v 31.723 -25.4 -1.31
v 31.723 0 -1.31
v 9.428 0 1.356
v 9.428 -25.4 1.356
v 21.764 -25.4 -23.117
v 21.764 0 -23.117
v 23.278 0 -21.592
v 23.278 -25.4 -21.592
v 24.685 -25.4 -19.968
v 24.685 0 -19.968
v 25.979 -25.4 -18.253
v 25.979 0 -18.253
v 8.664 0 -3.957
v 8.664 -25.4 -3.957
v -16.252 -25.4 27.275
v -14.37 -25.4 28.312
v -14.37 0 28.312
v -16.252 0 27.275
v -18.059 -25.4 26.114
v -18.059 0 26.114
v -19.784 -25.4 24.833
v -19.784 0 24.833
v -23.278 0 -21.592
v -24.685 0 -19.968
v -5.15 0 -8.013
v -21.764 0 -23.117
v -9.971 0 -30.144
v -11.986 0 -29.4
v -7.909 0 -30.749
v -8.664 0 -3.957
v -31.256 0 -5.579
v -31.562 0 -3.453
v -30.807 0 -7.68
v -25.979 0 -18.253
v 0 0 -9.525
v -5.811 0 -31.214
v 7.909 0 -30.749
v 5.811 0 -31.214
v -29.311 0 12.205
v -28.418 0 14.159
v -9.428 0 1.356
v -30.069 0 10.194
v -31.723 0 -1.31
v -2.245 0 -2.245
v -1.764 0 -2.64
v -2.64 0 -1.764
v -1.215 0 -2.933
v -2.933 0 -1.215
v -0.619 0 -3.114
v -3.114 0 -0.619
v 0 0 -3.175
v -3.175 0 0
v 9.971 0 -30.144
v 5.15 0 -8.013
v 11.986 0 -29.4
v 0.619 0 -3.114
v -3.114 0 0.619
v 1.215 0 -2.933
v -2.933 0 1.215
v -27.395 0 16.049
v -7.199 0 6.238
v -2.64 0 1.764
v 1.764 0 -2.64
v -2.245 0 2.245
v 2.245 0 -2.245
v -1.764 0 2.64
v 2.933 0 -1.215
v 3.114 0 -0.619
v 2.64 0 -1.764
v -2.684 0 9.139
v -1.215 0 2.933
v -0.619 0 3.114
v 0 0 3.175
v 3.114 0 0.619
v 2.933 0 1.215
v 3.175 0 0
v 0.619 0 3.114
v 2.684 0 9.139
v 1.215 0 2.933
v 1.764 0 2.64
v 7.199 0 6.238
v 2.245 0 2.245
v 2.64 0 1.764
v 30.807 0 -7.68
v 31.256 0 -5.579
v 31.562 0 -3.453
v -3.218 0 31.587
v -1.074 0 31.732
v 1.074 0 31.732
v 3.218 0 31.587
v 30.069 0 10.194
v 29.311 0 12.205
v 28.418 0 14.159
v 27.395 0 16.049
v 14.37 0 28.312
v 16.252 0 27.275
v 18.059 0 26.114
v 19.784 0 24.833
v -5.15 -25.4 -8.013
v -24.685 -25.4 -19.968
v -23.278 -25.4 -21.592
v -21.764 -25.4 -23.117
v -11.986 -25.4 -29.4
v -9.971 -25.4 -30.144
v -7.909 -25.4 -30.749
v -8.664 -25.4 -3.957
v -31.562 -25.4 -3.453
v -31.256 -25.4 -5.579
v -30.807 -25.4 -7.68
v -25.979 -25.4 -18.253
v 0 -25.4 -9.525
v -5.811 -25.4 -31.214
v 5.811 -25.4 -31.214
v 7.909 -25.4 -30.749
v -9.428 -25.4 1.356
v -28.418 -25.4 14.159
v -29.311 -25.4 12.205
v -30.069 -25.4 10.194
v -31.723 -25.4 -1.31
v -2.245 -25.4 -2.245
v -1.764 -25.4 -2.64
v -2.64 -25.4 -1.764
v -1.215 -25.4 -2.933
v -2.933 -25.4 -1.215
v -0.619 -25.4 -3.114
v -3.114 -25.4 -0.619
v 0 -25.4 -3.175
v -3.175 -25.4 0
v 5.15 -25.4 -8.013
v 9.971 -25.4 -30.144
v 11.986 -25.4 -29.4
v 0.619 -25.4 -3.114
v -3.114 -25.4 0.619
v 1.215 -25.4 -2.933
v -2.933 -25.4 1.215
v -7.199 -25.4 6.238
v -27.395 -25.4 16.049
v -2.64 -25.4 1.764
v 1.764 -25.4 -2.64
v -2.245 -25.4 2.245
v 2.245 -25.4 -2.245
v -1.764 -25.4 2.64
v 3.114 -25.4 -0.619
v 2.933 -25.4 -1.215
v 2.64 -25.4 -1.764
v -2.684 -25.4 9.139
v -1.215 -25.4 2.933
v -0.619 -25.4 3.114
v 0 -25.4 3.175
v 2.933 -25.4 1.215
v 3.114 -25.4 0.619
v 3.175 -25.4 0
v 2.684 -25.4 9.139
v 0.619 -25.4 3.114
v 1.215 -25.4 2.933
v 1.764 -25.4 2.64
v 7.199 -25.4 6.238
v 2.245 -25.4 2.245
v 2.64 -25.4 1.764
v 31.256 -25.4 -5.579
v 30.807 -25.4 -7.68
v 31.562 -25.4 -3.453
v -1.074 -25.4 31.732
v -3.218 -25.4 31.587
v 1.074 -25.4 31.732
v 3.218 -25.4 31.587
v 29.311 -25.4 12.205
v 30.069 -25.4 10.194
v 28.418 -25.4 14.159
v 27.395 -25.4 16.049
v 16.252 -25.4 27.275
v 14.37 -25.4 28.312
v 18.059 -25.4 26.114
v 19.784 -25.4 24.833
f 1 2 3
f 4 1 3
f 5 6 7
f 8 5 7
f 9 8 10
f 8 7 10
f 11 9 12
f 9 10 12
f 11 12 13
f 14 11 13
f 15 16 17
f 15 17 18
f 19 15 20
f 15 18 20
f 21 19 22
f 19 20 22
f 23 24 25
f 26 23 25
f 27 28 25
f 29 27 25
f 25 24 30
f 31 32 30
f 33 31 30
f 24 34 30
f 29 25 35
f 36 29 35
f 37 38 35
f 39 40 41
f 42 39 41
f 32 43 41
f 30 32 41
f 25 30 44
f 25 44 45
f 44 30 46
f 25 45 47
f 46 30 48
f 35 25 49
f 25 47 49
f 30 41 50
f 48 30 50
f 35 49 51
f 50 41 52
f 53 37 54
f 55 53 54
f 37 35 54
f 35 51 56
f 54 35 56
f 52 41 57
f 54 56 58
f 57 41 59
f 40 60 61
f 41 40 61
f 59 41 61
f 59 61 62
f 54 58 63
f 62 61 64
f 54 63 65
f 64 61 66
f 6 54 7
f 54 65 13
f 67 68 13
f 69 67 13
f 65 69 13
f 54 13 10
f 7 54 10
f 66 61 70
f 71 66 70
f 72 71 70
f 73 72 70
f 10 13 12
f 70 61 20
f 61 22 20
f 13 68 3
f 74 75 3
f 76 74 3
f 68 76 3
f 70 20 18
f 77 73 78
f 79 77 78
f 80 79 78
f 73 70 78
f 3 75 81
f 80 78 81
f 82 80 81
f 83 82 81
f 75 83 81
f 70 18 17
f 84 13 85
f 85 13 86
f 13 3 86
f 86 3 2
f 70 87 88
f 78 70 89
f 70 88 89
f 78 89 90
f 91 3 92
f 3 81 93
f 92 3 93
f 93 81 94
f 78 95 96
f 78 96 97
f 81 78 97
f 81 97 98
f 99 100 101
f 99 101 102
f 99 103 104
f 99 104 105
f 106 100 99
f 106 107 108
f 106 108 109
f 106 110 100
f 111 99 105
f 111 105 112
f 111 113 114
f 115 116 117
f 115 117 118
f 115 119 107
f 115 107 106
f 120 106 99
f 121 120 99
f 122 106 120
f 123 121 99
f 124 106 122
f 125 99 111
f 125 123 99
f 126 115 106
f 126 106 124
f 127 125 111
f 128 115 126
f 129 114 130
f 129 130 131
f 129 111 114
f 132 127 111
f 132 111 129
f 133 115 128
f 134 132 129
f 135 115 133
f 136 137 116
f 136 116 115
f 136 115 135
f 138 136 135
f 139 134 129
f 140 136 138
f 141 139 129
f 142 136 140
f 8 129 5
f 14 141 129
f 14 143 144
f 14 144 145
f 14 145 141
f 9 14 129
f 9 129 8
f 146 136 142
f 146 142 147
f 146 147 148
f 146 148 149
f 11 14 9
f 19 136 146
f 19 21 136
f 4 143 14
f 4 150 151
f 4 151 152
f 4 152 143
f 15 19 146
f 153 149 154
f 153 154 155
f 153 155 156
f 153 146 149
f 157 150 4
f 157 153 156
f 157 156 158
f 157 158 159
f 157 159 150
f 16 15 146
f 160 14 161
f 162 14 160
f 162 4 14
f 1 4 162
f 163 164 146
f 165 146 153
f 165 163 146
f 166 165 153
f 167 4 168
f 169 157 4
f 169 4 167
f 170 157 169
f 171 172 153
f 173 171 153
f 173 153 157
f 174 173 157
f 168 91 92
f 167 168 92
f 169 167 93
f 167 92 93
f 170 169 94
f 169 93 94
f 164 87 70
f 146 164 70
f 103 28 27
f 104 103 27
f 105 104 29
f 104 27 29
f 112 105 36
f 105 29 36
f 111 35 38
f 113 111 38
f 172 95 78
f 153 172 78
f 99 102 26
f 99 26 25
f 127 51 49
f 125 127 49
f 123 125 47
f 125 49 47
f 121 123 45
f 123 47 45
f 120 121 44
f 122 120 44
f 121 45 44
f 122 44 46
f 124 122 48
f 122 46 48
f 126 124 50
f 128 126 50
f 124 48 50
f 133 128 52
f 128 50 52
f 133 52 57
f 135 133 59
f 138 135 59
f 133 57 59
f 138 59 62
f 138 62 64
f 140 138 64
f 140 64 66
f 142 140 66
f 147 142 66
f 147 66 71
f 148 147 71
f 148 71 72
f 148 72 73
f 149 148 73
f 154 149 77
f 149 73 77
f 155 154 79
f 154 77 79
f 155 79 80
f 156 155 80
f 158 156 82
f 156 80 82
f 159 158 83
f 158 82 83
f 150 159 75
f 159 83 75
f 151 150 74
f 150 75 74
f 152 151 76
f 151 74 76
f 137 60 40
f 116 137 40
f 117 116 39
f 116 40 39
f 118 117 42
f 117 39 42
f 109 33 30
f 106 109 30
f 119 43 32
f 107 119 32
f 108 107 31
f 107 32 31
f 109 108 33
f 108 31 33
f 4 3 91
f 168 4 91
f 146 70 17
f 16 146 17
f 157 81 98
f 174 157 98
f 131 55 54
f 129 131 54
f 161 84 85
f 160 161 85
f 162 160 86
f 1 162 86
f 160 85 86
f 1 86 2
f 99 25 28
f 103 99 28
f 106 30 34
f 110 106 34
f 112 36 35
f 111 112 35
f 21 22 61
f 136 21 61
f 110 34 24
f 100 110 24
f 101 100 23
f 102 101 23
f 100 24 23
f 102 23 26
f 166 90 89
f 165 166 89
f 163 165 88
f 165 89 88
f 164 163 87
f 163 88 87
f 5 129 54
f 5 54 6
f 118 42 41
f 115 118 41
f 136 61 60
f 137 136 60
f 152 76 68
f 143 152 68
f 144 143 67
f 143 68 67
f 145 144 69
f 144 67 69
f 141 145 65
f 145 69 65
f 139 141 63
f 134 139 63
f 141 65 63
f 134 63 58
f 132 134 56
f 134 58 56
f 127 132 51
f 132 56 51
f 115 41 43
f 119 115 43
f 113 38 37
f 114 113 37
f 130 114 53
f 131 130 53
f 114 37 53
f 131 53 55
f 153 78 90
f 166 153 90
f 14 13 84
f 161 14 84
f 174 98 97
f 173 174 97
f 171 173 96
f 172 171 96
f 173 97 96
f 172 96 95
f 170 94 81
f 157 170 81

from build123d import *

# Parameters (mm, degrees)
F1_DEPTH = 25.4


with BuildPart() as f1:
    # F0 (on Front) → F1 (new body)
    with BuildSketch(Plane.XZ):
        with BuildLine():
            ThreePointArc((-9.428049, 1.355549), (-8.664245, 3.956828), (-7.198515, 6.237548))
            Line((-7.198515, 6.237548), (-27.395362, 16.048571))
            ThreePointArc((-27.395362, 16.048571), (-28.880816, 13.189427), (-30.068848, 10.194454))
            Line((-30.068848, 10.194454), (-9.428049, 1.355549))
        make_face()
        with BuildLine():
            ThreePointArc((-7.198515, 6.237548), (-5.149604, 8.01294), (-2.683503, 9.139171))
            Line((-2.683503, 9.139171), (-14.369933, 28.311968))
            ThreePointArc((-14.369933, 28.311968), (-17.165346, 26.7098), (-19.783986, 24.832567))
            Line((-19.783986, 24.832567), (-7.198515, 6.237548))
        make_face()
        with BuildLine():
            ThreePointArc((9.525, 0), (9.500731, 0.679506), (9.428049, 1.355549))
            ThreePointArc((9.428049, 1.355549), (8.664245, 3.956828), (7.198515, 6.237548))
            ThreePointArc((7.198515, 6.237548), (5.149604, 8.01294), (2.683503, 9.139171))
            ThreePointArc((2.683503, 9.139171), (0, 9.525), (-2.683503, 9.139171))
            ThreePointArc((-2.683503, 9.139171), (-5.149604, 8.01294), (-7.198515, 6.237548))
            ThreePointArc((-7.198515, 6.237548), (-8.664245, 3.956828), (-9.428049, 1.355549))
            ThreePointArc((-9.428049, 1.355549), (-9.428049, -1.355549), (-8.664245, -3.956828))
            ThreePointArc((-8.664245, -3.956828), (-7.198515, -6.237548), (-5.149604, -8.01294))
            ThreePointArc((-5.149604, -8.01294), (-2.683503, -9.139171), (0, -9.525))
            ThreePointArc((0, -9.525), (2.683503, -9.139171), (5.149604, -8.01294))
            ThreePointArc((5.149604, -8.01294), (7.198515, -6.237548), (8.664245, -3.956828))
            ThreePointArc((8.664245, -3.956828), (9.307324, -2.024684), (9.525, 0))
        make_face()
        with BuildLine():
            ThreePointArc((3.175, 0), (2.245064, -2.245064), (0, -3.175))
            ThreePointArc((0, -3.175), (-2.245064, 2.245064), (3.175, 0))
        make_face(mode=Mode.SUBTRACT)
        with BuildLine():
            ThreePointArc((-2.683503, 9.139171), (0, 9.525), (2.683503, 9.139171))
            Line((2.683503, 9.139171), (3.217849, 31.586515))
            ThreePointArc((3.217849, 31.586515), (0, 31.75), (-3.217849, 31.586515))
            Line((-3.217849, 31.586515), (-2.683503, 9.139171))
        make_face()
        with BuildLine():
            Line((7.198515, 6.237548), (19.783986, 24.832567))
            ThreePointArc((19.783986, 24.832567), (17.165346, 26.7098), (14.369933, 28.311968))
            Line((14.369933, 28.311968), (2.683503, 9.139171))
            ThreePointArc((2.683503, 9.139171), (5.149604, 8.01294), (7.198515, 6.237548))
        make_face()
        with BuildLine():
            Line((9.428049, 1.355549), (30.068848, 10.194454))
            ThreePointArc((30.068848, 10.194454), (28.880816, 13.189427), (27.395362, 16.048571))
            Line((27.395362, 16.048571), (7.198515, 6.237548))
            ThreePointArc((7.198515, 6.237548), (8.664245, 3.956828), (9.428049, 1.355549))
        make_face()
        with BuildLine():
            ThreePointArc((30.807062, -7.680326), (31.426831, -4.518496), (31.722958, -1.310134))
            Line((31.722958, -1.310134), (9.428049, 1.355549))
            ThreePointArc((9.428049, 1.355549), (9.500731, 0.679506), (9.525, 0))
            ThreePointArc((9.525, 0), (9.307324, -2.024684), (8.664245, -3.956828))
            Line((8.664245, -3.956828), (30.807062, -7.680326))
        make_face()
        with BuildLine():
            ThreePointArc((21.764252, -23.116657), (23.995049, -20.791828), (25.978738, -18.252881))
            Line((25.978738, -18.252881), (8.664245, -3.956828))
            ThreePointArc((8.664245, -3.956828), (7.198515, -6.237548), (5.149604, -8.01294))
            Line((5.149604, -8.01294), (21.764252, -23.116657))
        make_face()
        with BuildLine():
            Line((11.986453, -29.400467), (5.149604, -8.01294))
            ThreePointArc((5.149604, -8.01294), (2.683503, -9.139171), (0, -9.525))
            Line((0, -9.525), (5.811446, -31.213612))
            ThreePointArc((5.811446, -31.213612), (8.945009, -30.463902), (11.986453, -29.400467))
        make_face()
        with BuildLine():
            Line((-5.811446, -31.213612), (0, -9.525))
            ThreePointArc((0, -9.525), (-2.683503, -9.139171), (-5.149604, -8.01294))
            Line((-5.149604, -8.01294), (-11.986453, -29.400467))
            ThreePointArc((-11.986453, -29.400467), (-8.945009, -30.463902), (-5.811446, -31.213612))
        make_face()
        with BuildLine():
            Line((-21.764252, -23.116657), (-5.149604, -8.01294))
            ThreePointArc((-5.149604, -8.01294), (-7.198515, -6.237548), (-8.664245, -3.956828))
            Line((-8.664245, -3.956828), (-25.978738, -18.252881))
            ThreePointArc((-25.978738, -18.252881), (-23.995049, -20.791828), (-21.764252, -23.116657))
        make_face()
        with BuildLine():
            ThreePointArc((-8.664245, -3.956828), (-9.428049, -1.355549), (-9.428049, 1.355549))
            Line((-9.428049, 1.355549), (-31.722958, -1.310134))
            ThreePointArc((-31.722958, -1.310134), (-31.426831, -4.518496), (-30.807062, -7.680326))
            Line((-30.807062, -7.680326), (-8.664245, -3.956828))
        make_face()
    extrude(amount=F1_DEPTH)


solid = f1.part
